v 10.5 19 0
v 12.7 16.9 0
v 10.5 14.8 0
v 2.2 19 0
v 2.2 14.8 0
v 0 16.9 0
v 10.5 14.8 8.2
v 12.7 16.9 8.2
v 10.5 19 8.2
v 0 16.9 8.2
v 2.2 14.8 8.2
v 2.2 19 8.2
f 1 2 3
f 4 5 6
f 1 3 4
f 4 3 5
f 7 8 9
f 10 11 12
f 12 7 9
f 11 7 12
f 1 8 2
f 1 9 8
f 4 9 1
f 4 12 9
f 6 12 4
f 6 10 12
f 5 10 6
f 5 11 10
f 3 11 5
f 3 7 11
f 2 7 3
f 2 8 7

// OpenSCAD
$fn = 64;

// Overall bounding box must match: [12.7, 19, 8.2]  (X, Y, Z)
segment_size = [12.7, 19, 8.2];

W = segment_size[0];
H = segment_size[1];
T = segment_size[2];

// A-segment: top horizontal bar with beveled ends.
// Ensure visible geometry and keep it within the bounding box.
bar_h   = 4.2;                          // thickness in Y of the segment bar
chamfer = min(2.2, W/2 - 0.01);         // bevel length in X (safe)
y0      = H - bar_h;                    // place at top so overall Y fits exactly

module a_segment_2d() {
    // Chamfered rectangle spanning full width W and height bar_h
    polygon(points=[
        [0,            bar_h/2],
        [chamfer,      bar_h],
        [W - chamfer,  bar_h],
        [W,            bar_h/2],
        [W - chamfer,  0],
        [chamfer,      0]
    ]);
}

translate([0, y0, 0])
    linear_extrude(height=T, center=false, convexity=10)
        a_segment_2d();
